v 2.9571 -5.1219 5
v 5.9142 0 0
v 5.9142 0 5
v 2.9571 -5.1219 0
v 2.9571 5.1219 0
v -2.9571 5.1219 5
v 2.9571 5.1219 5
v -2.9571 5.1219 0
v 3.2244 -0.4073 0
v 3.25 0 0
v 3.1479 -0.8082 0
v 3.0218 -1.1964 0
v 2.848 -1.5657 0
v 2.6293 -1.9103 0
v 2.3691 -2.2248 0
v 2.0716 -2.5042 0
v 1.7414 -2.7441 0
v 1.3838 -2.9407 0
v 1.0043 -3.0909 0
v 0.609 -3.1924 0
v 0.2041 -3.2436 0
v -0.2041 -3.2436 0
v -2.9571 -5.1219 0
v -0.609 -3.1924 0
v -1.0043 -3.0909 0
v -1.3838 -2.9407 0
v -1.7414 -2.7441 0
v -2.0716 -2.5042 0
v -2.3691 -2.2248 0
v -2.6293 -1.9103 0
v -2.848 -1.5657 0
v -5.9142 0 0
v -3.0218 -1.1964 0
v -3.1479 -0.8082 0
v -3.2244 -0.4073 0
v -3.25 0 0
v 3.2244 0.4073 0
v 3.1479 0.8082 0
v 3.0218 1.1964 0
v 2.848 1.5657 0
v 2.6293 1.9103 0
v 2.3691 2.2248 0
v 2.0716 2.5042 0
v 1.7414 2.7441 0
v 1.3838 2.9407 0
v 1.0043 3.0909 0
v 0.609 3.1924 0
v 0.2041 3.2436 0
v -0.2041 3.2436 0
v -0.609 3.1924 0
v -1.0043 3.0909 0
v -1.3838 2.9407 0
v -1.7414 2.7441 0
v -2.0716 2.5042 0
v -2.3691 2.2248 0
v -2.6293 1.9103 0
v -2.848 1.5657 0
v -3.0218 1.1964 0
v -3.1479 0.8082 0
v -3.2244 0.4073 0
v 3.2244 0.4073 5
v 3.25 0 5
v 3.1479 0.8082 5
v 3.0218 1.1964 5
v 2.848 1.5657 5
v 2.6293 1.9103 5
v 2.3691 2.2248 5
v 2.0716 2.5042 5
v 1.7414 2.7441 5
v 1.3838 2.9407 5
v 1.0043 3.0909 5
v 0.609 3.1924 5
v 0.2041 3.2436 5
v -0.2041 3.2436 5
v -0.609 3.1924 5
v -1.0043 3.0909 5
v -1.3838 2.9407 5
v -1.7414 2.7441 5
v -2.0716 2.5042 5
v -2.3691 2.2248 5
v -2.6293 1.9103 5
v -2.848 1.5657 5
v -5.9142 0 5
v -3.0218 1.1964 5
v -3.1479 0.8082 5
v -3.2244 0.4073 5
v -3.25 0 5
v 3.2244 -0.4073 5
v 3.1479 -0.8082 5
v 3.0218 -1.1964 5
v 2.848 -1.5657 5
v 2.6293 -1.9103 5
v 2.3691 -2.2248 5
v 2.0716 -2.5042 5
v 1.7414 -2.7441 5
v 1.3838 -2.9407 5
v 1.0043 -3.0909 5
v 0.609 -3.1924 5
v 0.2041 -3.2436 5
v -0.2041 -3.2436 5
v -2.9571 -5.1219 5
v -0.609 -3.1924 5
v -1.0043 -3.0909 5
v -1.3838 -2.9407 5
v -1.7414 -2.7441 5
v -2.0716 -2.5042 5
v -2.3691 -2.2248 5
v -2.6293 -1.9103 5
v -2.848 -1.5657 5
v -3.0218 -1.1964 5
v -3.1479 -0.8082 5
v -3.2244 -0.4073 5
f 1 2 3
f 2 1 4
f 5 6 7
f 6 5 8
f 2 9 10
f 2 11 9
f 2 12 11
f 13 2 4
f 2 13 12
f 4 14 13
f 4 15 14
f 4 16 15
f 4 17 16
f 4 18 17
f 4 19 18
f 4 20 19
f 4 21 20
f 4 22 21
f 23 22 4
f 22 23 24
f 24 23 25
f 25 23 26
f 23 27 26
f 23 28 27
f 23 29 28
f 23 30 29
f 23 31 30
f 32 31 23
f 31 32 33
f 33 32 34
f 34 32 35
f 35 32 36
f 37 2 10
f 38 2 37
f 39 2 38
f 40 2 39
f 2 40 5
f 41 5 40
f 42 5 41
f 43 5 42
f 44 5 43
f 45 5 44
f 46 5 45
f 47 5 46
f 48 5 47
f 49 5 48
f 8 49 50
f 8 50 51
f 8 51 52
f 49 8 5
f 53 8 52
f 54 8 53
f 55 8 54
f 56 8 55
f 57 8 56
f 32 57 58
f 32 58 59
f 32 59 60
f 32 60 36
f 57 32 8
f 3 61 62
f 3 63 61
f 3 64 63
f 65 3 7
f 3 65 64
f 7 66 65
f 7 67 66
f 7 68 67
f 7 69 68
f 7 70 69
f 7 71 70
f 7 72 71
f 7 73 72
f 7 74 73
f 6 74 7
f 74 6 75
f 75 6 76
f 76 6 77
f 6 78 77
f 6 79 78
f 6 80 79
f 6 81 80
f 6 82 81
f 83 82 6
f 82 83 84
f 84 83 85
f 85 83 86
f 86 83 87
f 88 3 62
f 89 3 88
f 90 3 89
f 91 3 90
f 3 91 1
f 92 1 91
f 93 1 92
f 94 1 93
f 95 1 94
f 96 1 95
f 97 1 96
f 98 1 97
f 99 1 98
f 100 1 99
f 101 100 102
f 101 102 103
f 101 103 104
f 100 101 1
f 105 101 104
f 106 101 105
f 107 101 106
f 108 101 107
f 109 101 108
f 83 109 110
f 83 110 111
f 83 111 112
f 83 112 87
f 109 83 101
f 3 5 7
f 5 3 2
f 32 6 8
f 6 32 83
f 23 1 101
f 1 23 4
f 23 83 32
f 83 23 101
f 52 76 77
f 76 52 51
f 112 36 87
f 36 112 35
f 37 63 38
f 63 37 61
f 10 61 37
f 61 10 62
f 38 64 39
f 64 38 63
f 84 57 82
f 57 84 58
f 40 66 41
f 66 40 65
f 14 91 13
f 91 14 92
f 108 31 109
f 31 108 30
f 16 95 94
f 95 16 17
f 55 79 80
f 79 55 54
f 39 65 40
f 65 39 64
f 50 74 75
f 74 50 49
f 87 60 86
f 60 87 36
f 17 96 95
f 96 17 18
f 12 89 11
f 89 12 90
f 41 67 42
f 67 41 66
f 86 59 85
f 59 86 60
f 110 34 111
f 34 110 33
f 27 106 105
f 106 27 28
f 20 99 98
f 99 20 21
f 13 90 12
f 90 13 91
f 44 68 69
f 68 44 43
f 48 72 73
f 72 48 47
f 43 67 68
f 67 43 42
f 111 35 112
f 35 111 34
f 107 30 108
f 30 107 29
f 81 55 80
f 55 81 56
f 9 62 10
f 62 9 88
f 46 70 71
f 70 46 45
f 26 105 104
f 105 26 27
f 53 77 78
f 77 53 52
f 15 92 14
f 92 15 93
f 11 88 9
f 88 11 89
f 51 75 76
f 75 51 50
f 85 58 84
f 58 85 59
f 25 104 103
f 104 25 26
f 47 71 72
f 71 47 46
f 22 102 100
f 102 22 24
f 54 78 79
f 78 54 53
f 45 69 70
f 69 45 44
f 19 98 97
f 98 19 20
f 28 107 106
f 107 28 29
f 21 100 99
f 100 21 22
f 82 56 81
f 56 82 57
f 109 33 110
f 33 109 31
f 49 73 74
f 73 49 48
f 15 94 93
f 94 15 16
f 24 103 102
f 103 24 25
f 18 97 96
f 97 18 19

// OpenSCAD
$fn = 50;


difference() {
	union() {
		translate(v = [0, 0, 0]) {
			rotate(a = [0, 0, 0]) {
				difference() {
					union() {
						linear_extrude(height = 5) {
							polygon(points = [[5.9142500000, 0.0000000000], [2.9571250000, 5.1218907443], [-2.9571250000, 5.1218907443], [-5.9142500000, 0.0000000000], [-2.9571250000, -5.1218907443], [2.9571250000, -5.1218907443]]);
						}
					}
					union();
				}
			}
		}
	}
	union() {
		cylinder(h = 100, r = 3.2500000000);
	}
}
